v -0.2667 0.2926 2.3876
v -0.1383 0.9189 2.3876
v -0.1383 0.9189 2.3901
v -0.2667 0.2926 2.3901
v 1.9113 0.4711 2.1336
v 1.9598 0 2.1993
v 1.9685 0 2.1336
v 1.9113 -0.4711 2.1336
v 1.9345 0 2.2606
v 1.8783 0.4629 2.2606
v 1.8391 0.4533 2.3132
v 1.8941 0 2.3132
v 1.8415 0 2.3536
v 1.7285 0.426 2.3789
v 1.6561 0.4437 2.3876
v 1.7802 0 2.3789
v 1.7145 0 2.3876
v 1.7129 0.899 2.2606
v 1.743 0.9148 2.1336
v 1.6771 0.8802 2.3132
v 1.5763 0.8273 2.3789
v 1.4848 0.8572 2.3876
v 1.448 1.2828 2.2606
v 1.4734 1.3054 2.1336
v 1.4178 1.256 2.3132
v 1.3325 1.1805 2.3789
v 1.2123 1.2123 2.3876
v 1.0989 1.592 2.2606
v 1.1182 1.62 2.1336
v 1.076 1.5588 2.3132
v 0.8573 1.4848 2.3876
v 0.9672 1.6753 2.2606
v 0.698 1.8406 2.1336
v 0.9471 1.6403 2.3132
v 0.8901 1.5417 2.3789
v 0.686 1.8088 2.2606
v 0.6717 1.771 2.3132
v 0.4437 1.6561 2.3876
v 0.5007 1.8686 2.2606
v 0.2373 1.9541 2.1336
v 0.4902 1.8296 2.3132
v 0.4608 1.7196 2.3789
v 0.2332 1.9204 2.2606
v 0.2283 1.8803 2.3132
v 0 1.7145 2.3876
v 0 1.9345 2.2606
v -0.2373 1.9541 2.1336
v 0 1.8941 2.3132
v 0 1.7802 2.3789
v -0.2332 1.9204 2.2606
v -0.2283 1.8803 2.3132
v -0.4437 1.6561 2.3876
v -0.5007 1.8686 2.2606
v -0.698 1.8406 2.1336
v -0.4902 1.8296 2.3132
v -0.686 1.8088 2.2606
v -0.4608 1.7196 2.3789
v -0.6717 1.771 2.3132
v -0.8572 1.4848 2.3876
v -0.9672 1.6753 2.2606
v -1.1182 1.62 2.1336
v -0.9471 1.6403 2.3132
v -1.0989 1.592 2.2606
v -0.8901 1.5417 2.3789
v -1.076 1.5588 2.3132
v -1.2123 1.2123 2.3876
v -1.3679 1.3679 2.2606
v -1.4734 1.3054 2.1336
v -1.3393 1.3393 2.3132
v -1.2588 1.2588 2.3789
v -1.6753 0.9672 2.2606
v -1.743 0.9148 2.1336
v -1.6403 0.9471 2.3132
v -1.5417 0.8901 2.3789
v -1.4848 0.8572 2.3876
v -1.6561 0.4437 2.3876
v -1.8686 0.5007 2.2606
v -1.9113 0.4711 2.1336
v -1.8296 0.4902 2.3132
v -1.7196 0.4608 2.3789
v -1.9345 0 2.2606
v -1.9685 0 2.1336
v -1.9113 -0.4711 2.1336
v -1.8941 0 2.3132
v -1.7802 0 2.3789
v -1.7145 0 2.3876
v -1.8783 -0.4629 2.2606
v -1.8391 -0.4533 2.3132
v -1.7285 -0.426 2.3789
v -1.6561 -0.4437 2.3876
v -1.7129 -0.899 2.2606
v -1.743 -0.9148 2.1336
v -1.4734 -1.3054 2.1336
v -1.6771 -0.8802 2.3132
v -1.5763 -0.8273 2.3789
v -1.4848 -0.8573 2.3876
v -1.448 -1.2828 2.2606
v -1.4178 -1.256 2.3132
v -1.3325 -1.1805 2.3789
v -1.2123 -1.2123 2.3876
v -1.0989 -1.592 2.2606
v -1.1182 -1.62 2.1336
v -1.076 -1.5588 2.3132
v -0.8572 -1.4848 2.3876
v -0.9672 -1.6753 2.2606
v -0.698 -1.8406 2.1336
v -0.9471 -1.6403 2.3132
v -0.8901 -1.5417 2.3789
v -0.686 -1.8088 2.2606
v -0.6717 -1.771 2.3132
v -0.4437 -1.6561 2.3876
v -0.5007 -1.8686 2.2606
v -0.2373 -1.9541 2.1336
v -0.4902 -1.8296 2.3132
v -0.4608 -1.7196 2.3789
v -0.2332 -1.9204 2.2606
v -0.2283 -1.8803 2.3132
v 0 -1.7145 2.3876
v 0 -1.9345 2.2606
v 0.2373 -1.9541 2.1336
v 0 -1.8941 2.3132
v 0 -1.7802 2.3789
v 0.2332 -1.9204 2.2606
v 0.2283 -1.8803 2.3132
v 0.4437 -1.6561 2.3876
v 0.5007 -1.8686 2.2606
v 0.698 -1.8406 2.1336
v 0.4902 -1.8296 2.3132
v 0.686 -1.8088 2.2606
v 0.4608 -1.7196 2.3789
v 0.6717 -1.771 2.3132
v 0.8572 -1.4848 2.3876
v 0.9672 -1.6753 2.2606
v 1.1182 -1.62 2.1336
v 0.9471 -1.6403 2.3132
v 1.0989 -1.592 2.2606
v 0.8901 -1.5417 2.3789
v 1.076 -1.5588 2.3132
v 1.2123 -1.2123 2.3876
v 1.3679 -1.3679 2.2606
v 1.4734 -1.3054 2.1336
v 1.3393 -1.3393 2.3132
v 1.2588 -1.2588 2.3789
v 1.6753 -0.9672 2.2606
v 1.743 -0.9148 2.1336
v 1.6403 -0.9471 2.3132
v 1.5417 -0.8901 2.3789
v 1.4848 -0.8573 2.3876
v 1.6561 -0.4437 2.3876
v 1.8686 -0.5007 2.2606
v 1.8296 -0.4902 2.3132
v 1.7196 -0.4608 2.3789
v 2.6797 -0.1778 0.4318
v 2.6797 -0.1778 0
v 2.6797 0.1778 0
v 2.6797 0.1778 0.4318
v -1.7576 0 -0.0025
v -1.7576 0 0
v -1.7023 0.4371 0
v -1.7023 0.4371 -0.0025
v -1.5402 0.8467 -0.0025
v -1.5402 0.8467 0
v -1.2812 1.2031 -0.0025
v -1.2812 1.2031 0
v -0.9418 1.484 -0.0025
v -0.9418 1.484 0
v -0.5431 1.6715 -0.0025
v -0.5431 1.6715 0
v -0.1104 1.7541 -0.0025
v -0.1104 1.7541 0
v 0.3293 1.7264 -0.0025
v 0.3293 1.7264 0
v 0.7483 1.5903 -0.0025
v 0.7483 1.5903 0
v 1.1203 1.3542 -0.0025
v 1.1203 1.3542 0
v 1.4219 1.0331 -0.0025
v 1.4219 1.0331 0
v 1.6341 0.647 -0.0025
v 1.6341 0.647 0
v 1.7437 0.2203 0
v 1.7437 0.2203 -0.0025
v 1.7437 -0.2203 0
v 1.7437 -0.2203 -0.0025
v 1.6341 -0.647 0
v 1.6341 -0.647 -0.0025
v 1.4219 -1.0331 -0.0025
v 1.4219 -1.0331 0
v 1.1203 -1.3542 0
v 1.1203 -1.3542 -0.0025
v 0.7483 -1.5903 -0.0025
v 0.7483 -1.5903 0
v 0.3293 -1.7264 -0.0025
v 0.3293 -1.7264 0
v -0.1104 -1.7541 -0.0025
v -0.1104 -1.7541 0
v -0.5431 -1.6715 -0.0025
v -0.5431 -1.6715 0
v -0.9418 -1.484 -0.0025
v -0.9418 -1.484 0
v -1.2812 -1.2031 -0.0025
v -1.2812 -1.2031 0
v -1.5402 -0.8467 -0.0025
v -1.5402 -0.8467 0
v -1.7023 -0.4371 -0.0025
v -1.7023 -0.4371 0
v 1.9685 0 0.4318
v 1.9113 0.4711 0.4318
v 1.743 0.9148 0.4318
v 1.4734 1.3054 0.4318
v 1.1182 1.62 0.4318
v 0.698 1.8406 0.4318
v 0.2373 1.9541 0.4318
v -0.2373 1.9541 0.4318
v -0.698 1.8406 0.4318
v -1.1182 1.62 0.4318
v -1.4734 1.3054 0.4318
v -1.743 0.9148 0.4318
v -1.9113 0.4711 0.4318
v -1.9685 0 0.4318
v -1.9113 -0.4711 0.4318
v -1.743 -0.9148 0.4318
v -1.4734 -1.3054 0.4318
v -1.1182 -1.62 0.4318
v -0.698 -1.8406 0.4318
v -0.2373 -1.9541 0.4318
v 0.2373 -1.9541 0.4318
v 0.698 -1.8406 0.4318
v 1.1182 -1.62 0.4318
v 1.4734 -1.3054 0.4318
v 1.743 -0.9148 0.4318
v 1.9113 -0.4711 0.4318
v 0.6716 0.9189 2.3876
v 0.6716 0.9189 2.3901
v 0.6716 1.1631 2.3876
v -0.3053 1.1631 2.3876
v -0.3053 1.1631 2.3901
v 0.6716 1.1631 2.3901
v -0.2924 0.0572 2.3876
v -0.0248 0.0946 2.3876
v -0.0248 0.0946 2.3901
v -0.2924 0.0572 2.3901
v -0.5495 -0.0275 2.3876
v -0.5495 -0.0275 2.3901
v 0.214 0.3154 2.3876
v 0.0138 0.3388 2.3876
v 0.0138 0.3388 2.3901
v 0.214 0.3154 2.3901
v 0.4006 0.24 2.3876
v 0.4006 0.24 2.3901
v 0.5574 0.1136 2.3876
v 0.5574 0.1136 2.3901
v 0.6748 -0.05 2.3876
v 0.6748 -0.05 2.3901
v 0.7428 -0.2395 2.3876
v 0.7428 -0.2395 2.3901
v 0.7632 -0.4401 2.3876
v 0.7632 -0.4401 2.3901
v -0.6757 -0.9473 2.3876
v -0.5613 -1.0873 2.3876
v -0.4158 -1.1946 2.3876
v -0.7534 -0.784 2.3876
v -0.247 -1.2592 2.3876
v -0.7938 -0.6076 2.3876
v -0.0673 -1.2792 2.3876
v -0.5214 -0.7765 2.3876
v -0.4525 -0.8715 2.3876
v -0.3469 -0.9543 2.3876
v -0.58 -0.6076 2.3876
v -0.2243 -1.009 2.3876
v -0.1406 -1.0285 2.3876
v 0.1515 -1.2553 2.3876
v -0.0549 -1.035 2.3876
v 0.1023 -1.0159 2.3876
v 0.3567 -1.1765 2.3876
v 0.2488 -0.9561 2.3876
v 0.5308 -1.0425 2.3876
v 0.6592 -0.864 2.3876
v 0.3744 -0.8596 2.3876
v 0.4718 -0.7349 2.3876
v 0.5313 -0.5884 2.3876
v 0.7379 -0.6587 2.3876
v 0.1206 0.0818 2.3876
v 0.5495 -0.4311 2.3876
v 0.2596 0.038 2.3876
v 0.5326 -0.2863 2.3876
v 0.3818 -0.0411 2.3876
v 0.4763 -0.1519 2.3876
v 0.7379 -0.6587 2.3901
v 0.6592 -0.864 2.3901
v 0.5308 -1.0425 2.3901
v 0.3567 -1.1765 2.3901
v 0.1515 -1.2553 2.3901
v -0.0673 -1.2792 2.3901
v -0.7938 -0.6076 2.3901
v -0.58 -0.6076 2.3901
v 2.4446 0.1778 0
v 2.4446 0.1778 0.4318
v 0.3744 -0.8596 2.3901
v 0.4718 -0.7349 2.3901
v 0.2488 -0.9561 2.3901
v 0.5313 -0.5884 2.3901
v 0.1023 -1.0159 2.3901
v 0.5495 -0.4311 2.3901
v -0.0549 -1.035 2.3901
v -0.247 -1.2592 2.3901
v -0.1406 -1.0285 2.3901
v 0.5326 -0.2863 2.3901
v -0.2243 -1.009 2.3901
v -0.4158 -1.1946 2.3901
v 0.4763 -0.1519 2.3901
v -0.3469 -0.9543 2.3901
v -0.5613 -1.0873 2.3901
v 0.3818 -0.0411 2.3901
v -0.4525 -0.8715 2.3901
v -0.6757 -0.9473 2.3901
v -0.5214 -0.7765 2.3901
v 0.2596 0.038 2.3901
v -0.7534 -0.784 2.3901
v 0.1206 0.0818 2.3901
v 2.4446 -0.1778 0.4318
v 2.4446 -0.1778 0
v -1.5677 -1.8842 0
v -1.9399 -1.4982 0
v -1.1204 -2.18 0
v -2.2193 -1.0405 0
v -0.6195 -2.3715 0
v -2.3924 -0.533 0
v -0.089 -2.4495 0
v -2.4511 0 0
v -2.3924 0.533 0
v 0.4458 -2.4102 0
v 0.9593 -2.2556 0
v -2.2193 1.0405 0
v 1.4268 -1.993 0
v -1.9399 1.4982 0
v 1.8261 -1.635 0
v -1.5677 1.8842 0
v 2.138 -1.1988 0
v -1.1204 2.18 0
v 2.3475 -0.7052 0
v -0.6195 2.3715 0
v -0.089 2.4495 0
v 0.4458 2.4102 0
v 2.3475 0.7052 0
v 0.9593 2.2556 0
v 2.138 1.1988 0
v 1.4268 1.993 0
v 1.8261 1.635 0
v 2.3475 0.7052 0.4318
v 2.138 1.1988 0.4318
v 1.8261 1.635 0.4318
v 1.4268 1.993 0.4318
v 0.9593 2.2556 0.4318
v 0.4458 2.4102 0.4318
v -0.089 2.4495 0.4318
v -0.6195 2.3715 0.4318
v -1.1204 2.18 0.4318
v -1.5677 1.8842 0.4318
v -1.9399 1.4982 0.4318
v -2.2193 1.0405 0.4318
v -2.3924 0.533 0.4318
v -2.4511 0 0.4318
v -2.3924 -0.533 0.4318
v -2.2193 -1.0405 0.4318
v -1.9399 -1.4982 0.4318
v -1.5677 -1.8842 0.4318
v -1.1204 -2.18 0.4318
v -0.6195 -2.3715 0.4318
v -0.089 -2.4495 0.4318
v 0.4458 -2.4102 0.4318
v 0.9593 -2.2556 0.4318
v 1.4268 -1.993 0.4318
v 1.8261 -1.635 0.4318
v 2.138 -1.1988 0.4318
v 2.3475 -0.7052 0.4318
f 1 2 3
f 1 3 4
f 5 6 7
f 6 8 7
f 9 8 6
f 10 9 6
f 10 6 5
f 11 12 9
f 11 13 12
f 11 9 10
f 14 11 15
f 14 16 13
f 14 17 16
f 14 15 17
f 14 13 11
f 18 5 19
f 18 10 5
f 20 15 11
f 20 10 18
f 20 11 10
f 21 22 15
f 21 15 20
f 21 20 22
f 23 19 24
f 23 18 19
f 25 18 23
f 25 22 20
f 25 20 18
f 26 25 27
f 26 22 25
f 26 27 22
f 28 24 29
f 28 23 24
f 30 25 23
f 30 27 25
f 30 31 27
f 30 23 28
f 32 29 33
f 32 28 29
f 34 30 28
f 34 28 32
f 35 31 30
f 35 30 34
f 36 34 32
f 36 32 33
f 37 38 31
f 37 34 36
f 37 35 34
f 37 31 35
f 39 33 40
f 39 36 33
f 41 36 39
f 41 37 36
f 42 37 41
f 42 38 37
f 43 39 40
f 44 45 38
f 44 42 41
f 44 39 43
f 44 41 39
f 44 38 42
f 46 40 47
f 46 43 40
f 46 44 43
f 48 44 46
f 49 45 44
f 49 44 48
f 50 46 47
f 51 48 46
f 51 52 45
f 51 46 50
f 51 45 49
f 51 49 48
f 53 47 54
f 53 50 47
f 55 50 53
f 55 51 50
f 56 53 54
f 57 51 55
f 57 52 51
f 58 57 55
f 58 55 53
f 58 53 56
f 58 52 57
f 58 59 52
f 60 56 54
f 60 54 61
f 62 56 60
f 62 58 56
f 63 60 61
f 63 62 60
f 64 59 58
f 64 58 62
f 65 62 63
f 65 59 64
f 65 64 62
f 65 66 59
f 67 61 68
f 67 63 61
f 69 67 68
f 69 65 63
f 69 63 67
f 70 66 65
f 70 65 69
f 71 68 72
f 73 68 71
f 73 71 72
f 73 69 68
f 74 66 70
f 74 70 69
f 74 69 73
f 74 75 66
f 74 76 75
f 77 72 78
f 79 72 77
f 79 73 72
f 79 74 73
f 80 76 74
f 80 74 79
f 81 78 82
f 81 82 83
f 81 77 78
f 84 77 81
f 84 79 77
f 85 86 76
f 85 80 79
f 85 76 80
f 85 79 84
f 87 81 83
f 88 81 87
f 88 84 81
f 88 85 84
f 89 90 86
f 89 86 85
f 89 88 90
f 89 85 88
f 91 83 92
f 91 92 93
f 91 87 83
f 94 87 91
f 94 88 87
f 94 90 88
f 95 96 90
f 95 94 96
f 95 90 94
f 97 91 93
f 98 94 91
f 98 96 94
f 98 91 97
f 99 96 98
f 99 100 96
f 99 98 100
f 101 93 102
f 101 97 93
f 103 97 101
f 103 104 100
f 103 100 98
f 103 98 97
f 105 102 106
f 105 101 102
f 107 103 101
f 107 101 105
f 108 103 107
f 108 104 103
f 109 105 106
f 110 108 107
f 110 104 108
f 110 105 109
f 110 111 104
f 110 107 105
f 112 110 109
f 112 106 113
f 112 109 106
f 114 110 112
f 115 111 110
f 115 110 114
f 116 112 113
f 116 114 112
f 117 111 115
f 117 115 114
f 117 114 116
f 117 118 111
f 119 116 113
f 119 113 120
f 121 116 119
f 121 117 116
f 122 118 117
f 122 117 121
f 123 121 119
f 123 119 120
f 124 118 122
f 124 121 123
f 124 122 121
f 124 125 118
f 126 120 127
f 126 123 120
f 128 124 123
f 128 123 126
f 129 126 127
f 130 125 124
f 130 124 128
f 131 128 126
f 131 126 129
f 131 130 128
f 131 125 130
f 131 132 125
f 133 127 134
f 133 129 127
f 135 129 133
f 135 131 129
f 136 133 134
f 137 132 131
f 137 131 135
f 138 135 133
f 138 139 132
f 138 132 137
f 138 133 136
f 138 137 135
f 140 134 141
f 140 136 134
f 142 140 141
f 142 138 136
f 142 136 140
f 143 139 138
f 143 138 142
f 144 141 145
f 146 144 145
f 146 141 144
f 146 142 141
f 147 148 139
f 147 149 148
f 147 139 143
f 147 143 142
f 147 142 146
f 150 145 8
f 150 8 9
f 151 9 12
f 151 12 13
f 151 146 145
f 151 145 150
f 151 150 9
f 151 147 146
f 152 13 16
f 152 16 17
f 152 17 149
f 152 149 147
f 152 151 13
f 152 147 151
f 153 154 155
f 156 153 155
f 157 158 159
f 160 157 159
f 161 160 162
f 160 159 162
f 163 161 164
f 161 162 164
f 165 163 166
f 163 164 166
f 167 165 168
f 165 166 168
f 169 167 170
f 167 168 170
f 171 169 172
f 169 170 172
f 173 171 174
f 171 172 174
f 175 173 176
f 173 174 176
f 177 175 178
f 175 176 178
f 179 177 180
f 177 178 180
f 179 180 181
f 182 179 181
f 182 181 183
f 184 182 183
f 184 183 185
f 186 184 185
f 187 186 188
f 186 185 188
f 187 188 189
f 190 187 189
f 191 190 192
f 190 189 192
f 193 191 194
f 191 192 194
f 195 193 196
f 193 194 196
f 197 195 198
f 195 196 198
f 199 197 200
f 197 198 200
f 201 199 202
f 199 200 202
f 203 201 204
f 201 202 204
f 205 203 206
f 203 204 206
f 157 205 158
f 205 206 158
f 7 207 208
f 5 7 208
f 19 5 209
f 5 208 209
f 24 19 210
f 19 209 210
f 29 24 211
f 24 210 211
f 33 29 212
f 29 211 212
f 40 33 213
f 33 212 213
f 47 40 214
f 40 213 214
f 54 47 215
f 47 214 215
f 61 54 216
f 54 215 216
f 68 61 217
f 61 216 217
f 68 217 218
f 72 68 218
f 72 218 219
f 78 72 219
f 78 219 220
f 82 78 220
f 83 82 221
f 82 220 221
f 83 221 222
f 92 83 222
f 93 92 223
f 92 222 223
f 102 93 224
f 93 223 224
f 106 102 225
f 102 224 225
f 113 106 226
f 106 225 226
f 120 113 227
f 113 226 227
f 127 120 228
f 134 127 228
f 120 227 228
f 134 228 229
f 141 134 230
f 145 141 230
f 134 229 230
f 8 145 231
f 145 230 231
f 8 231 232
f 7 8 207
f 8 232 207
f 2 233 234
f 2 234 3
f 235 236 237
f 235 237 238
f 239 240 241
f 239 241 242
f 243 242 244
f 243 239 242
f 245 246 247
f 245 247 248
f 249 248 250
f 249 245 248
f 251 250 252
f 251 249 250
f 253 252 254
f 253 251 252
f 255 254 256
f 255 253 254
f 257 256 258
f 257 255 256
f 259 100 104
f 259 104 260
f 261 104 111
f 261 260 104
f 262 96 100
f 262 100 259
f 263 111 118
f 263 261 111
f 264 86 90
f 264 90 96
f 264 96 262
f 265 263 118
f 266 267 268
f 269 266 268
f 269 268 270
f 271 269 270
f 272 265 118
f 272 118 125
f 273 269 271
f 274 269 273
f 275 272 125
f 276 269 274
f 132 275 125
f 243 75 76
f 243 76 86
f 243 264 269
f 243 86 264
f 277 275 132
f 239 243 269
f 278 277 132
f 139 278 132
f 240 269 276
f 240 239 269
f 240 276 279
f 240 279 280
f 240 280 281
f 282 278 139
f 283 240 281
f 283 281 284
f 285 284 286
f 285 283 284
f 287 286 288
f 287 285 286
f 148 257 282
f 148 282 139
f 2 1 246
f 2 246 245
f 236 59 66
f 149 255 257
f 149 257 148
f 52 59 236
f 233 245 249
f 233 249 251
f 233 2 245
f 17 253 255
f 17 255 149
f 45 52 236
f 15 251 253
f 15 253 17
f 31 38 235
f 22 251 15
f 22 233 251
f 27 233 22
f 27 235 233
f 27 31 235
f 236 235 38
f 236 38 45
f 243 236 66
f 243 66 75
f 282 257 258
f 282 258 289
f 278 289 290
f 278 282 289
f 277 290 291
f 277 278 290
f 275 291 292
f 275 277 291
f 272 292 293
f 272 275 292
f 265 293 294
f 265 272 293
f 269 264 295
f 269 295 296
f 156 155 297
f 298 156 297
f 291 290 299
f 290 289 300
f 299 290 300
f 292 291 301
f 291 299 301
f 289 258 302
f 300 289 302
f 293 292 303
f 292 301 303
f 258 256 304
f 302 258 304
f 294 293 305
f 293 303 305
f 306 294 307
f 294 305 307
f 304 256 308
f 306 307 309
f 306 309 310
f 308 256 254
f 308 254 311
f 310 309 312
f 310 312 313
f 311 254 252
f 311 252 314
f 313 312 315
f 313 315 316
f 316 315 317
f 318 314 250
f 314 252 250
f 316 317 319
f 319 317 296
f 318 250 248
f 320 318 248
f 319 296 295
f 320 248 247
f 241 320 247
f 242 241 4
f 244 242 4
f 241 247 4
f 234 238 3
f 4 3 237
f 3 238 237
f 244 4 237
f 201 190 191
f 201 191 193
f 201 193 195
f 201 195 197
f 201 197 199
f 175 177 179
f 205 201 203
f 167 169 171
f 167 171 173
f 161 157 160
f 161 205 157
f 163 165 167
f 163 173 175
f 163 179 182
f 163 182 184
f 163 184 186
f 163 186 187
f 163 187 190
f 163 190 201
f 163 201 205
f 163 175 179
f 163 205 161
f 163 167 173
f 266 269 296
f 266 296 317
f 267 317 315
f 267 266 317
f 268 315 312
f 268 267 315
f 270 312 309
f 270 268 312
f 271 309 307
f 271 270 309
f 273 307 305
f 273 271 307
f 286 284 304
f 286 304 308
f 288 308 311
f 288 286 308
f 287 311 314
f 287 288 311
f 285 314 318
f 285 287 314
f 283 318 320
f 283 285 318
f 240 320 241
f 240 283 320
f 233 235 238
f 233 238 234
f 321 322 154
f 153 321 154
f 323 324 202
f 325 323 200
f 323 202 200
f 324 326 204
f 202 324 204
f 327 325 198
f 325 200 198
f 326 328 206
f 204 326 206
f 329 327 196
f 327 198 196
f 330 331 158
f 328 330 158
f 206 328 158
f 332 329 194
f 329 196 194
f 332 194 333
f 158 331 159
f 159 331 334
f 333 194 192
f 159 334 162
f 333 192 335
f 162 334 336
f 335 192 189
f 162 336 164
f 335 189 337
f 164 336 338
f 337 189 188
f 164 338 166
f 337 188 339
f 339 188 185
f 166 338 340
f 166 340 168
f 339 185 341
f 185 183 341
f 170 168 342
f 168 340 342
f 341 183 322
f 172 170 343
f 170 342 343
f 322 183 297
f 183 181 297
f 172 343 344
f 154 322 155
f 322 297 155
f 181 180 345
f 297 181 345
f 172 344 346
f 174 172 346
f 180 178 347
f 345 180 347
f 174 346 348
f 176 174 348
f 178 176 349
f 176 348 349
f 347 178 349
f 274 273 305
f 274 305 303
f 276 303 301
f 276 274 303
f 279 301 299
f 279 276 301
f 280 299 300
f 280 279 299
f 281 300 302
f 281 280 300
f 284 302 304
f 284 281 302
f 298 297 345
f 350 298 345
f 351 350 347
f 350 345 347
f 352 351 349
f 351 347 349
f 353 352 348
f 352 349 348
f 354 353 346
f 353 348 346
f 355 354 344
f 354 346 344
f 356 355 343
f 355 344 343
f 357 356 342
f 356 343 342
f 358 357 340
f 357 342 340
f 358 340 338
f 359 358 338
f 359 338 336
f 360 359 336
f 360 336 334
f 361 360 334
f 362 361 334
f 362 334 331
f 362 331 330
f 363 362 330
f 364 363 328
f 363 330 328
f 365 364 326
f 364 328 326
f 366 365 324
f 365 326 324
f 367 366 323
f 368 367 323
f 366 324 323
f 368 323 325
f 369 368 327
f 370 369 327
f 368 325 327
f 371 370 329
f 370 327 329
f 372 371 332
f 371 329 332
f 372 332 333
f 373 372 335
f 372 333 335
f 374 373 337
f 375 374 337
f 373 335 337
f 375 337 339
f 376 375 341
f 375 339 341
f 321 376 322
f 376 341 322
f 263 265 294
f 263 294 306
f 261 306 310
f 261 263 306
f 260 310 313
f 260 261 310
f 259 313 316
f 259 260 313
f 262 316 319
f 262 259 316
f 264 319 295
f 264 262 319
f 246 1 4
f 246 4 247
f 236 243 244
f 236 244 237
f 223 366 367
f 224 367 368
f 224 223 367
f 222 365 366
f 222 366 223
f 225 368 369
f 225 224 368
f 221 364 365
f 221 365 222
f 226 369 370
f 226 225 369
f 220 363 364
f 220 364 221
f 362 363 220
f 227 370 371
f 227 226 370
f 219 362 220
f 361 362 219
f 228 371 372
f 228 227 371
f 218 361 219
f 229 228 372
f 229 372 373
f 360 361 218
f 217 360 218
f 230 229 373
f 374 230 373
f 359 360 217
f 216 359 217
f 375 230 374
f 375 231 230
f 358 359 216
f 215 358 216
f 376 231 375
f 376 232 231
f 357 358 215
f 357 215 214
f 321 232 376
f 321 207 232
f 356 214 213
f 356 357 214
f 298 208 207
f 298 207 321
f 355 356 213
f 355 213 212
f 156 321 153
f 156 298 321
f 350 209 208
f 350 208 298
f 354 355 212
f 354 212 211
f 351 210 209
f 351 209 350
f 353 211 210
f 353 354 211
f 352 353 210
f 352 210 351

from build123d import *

# Parameters (mm, degrees)
BOSS_EXTRUDE1_DEPTH = 0.4318
SKETCH2_R           = 1.9685
BOSS_EXTRUDE2_DEPTH = 1.9558
SKETCH3_R           = 1.757566481
BOSS_EXTRUDE3_DEPTH = 0.00254
FILLET1_R           = 0.254
BOSS_EXTRUDE6_DEPTH = 0.00254


with BuildPart() as part:
    # Sketch1 → Boss-Extrude1 (new body)
    with BuildSketch(Plane.XY):
        with BuildLine():
            Line((2.6797, 0.1778), (2.4511, 0.1778))
            Line((2.4511, 0.1778), (2.44464279, 0.1778))
            ThreePointArc((2.44464279, 0.1778), (-2.4511, 0), (2.44464279, -0.1778))
            Line((2.44464279, -0.1778), (2.4511, -0.1778))
            Line((2.4511, -0.1778), (2.6797, -0.1778))
            Line((2.6797, -0.1778), (2.6797, 0.1778))
        make_face()
    extrude(amount=BOSS_EXTRUDE1_DEPTH)

    # Sketch2 → Boss-Extrude2 (add)
    with BuildSketch(Plane.XY.offset(0.4318)):
        Circle(SKETCH2_R)
    extrude(amount=BOSS_EXTRUDE2_DEPTH)

    # Sketch3 → Boss-Extrude3 (add)
    with BuildSketch(Plane(origin=(0, 0, 0), x_dir=(-1, 0, 0), z_dir=(0, 0, -1))):
        Circle(SKETCH3_R)
    extrude(amount=BOSS_EXTRUDE3_DEPTH)

    # Fillet1
    fillet1_edges = [part.edges().sort_by_distance(p)[0] for p in [
        (-1.9685, 0, 2.3876),
    ]]
    fillet(fillet1_edges, radius=FILLET1_R)

    # Sketch4 → Boss-Extrude6 (add)
    with BuildSketch(Plane.XY.offset(2.3876)):
        with BuildLine():
            Line((0.671634615, 1.163108793), (0.671634615, 0.918878024))
            Line((0.671634615, 0.918878024), (-0.138333834, 0.918878024))
            Line((-0.138333834, 0.918878024), (-0.266650391, 0.292559664))
            add(Edge.make_bspline(
                [(-0.266650391, 0.292559664), (-0.241439162, 0.299519903), (-0.192596393, 0.313004264), (-0.120505845, 0.327976047), (-0.052067221, 0.337001287), (-0.007656656, 0.338233625), (0.013833383, 0.338829947)],
                knots=[0, 0, 0, 0, 7.8447e-05, 0.000151978, 0.000220729, 0.000285189, 0.000285189, 0.000285189, 0.000285189], degree=3))
            add(Edge.make_bspline(
                [(0.013833383, 0.338829947), (0.040424285, 0.338254409), (0.092708641, 0.337122756), (0.169207282, 0.326256194), (0.242231982, 0.309152074), (0.311630023, 0.285257576), (0.377529791, 0.254702918), (0.439324971, 0.216534923), (0.497943123, 0.171948853), (0.552332637, 0.120687336), (0.601675068, 0.064271022), (0.645058715, 0.003611828), (0.68190862, -0.060700743), (0.711545491, -0.129281157), (0.735211261, -0.201371224), (0.750962886, -0.277729463), (0.761451754, -0.35763613), (0.762623592, -0.412271918), (0.763221154, -0.440132643)],
                knots=[0, 0, 0, 0, 7.9731e-05, 0.000156771, 0.000231283, 0.000304447, 0.000376577, 0.000448734, 0.00052191, 0.000597165, 0.000672552, 0.000746414, 0.000820549, 0.00089446, 0.000970187, 0.001047746, 0.001128035, 0.001211579, 0.001211579, 0.001211579, 0.001211579], degree=3))
            add(Edge.make_bspline(
                [(0.763221154, -0.440132643), (0.762768665, -0.45953794), (0.761869803, -0.498086286), (0.757298764, -0.555334394), (0.748497857, -0.611370536), (0.736681602, -0.666202146), (0.721344707, -0.719725415), (0.702778404, -0.772093544), (0.680057178, -0.822980589), (0.65513476, -0.872868045), (0.627072424, -0.920628101), (0.59592669, -0.965292858), (0.563020882, -1.007532342), (0.527614154, -1.046893543), (0.489377406, -1.08311781), (0.448773714, -1.116420123), (0.406127078, -1.147363671), (0.360777708, -1.174692389), (0.313736126, -1.199840401), (0.264322999, -1.220471236), (0.21366313, -1.238916077), (0.161027384, -1.253618274), (0.106534987, -1.265138458), (0.050096113, -1.272962974), (-0.007993236, -1.278661943), (-0.047368914, -1.279018693), (-0.067258864, -1.279198899)],
                knots=[0, 0, 0, 0, 5.8227e-05, 0.000115667, 0.000172134, 0.000228272, 0.000283835, 0.000339058, 0.000394805, 0.00045091, 0.000506295, 0.00056081, 0.000614153, 0.000666841, 0.000719477, 0.000772002, 0.000824293, 0.000877388, 0.00093073, 0.000984158, 0.001037872, 0.001092387, 0.001147959, 0.001204828, 0.001263259, 0.001322903, 0.001322903, 0.001322903, 0.001322903], degree=3))
            add(Edge.make_bspline(
                [(-0.067258864, -1.279198899), (-0.090985762, -1.278728883), (-0.137665631, -1.277804181), (-0.206055517, -1.268130533), (-0.271855989, -1.254275797), (-0.334537362, -1.233432192), (-0.394661382, -1.207315121), (-0.451418624, -1.174306798), (-0.50625934, -1.136901372), (-0.556954136, -1.09275956), (-0.604004992, -1.044511569), (-0.646123527, -0.992152888), (-0.68363405, -0.936547679), (-0.715935875, -0.877425899), (-0.743488993, -0.814942898), (-0.765134547, -0.748864571), (-0.782604999, -0.679536176), (-0.789996005, -0.631806734), (-0.79375, -0.607564284)],
                knots=[0, 0, 0, 0, 7.1133e-05, 0.000139945, 0.000206844, 0.000272613, 0.000337757, 0.000403135, 0.000469296, 0.000536609, 0.000604413, 0.000671238, 0.000737917, 0.000805377, 0.000873088, 0.000942477, 0.001013743, 0.001087302, 0.001087302, 0.001087302, 0.001087302], degree=3))
            Line((-0.79375, -0.607564284), (-0.580048077, -0.607564284))
            add(Edge.make_bspline(
                [(-0.580048077, -0.607564284), (-0.574789898, -0.630272192), (-0.564683385, -0.673918051), (-0.542499831, -0.735239553), (-0.515376798, -0.789885311), (-0.483124911, -0.838578188), (-0.444650694, -0.881038595), (-0.400747636, -0.91887806), (-0.351525346, -0.953015068), (-0.296829238, -0.981469486), (-0.239126053, -1.005736978), (-0.178732648, -1.021896613), (-0.117293441, -1.033259185), (-0.075738335, -1.034396579), (-0.05485652, -1.03496813)],
                knots=[0, 0, 0, 0, 6.9879e-05, 0.000134311, 0.000195109, 0.000252527, 0.000308938, 0.000366422, 0.000426096, 0.000488192, 0.000551085, 0.000613465, 0.000675418, 0.000737996, 0.000737996, 0.000737996, 0.000737996], degree=3))
            add(Edge.make_bspline(
                [(-0.05485652, -1.03496813), (-0.034474079, -1.034409708), (0.005659116, -1.03331017), (0.064721863, -1.024847199), (0.12174455, -1.011813209), (0.17616452, -0.992307468), (0.228934067, -0.968600615), (0.278718365, -0.938178394), (0.326957644, -0.903167203), (0.372152499, -0.863055639), (0.413545053, -0.818853043), (0.450118413, -0.771583602), (0.480582706, -0.721157676), (0.506255377, -0.668448263), (0.525749853, -0.612877673), (0.539657021, -0.554706338), (0.547823388, -0.493790575), (0.54894678, -0.452241634), (0.549519231, -0.431069392)],
                knots=[0, 0, 0, 0, 6.1125e-05, 0.000120355, 0.00017867, 0.0002363, 0.000293503, 0.000351914, 0.000410973, 0.000472137, 0.000532884, 0.000592419, 0.000651076, 0.000709321, 0.000768009, 0.000827362, 0.000888483, 0.000951991, 0.000951991, 0.000951991, 0.000951991], degree=3))
            add(Edge.make_bspline(
                [(0.549519231, -0.431069392), (0.54907123, -0.411967854), (0.548194331, -0.374579311), (0.541029782, -0.319879136), (0.528567699, -0.268122299), (0.511270381, -0.219058864), (0.489308787, -0.172642558), (0.462471207, -0.128825476), (0.430253984, -0.088185136), (0.393452182, -0.050702524), (0.35313555, -0.01610985), (0.308610432, 0.013379609), (0.260808589, 0.038188096), (0.210305951, 0.059597573), (0.155901261, 0.074974152), (0.09867191, 0.086518374), (0.037999899, 0.093196326), (-0.003481944, 0.094122896), (-0.024804687, 0.094599178)],
                knots=[0, 0, 0, 0, 5.7291e-05, 0.000112139, 0.000165129, 0.000216726, 0.000267935, 0.000318904, 0.000370532, 0.000423155, 0.000476292, 0.000529609, 0.000582951, 0.000637698, 0.000693852, 0.000752227, 0.000812701, 0.000876665, 0.000876665, 0.000876665, 0.000876665], degree=3))
            add(Edge.make_bspline(
                [(-0.024804687, 0.094599178), (-0.043262048, 0.094204168), (-0.081371815, 0.093388574), (-0.139830024, 0.087383404), (-0.201260642, 0.077695598), (-0.265428183, 0.064369955), (-0.33252535, 0.046931669), (-0.402410548, 0.026034839), (-0.475230715, 0.001050765), (-0.524296524, -0.017817045), (-0.549519231, -0.027516207)],
                knots=[0, 0, 0, 0, 5.5366e-05, 0.000114318, 0.000176116, 0.000241883, 0.000310838, 0.000384033, 0.000460664, 0.00054173, 0.00054173, 0.00054173, 0.00054173], degree=3))
            Line((-0.549519231, -0.027516207), (-0.305288462, 1.163108793))
            Line((-0.305288462, 1.163108793), (0.671634615, 1.163108793))
        make_face()
    extrude(amount=BOSS_EXTRUDE6_DEPTH)


solid = part.part
